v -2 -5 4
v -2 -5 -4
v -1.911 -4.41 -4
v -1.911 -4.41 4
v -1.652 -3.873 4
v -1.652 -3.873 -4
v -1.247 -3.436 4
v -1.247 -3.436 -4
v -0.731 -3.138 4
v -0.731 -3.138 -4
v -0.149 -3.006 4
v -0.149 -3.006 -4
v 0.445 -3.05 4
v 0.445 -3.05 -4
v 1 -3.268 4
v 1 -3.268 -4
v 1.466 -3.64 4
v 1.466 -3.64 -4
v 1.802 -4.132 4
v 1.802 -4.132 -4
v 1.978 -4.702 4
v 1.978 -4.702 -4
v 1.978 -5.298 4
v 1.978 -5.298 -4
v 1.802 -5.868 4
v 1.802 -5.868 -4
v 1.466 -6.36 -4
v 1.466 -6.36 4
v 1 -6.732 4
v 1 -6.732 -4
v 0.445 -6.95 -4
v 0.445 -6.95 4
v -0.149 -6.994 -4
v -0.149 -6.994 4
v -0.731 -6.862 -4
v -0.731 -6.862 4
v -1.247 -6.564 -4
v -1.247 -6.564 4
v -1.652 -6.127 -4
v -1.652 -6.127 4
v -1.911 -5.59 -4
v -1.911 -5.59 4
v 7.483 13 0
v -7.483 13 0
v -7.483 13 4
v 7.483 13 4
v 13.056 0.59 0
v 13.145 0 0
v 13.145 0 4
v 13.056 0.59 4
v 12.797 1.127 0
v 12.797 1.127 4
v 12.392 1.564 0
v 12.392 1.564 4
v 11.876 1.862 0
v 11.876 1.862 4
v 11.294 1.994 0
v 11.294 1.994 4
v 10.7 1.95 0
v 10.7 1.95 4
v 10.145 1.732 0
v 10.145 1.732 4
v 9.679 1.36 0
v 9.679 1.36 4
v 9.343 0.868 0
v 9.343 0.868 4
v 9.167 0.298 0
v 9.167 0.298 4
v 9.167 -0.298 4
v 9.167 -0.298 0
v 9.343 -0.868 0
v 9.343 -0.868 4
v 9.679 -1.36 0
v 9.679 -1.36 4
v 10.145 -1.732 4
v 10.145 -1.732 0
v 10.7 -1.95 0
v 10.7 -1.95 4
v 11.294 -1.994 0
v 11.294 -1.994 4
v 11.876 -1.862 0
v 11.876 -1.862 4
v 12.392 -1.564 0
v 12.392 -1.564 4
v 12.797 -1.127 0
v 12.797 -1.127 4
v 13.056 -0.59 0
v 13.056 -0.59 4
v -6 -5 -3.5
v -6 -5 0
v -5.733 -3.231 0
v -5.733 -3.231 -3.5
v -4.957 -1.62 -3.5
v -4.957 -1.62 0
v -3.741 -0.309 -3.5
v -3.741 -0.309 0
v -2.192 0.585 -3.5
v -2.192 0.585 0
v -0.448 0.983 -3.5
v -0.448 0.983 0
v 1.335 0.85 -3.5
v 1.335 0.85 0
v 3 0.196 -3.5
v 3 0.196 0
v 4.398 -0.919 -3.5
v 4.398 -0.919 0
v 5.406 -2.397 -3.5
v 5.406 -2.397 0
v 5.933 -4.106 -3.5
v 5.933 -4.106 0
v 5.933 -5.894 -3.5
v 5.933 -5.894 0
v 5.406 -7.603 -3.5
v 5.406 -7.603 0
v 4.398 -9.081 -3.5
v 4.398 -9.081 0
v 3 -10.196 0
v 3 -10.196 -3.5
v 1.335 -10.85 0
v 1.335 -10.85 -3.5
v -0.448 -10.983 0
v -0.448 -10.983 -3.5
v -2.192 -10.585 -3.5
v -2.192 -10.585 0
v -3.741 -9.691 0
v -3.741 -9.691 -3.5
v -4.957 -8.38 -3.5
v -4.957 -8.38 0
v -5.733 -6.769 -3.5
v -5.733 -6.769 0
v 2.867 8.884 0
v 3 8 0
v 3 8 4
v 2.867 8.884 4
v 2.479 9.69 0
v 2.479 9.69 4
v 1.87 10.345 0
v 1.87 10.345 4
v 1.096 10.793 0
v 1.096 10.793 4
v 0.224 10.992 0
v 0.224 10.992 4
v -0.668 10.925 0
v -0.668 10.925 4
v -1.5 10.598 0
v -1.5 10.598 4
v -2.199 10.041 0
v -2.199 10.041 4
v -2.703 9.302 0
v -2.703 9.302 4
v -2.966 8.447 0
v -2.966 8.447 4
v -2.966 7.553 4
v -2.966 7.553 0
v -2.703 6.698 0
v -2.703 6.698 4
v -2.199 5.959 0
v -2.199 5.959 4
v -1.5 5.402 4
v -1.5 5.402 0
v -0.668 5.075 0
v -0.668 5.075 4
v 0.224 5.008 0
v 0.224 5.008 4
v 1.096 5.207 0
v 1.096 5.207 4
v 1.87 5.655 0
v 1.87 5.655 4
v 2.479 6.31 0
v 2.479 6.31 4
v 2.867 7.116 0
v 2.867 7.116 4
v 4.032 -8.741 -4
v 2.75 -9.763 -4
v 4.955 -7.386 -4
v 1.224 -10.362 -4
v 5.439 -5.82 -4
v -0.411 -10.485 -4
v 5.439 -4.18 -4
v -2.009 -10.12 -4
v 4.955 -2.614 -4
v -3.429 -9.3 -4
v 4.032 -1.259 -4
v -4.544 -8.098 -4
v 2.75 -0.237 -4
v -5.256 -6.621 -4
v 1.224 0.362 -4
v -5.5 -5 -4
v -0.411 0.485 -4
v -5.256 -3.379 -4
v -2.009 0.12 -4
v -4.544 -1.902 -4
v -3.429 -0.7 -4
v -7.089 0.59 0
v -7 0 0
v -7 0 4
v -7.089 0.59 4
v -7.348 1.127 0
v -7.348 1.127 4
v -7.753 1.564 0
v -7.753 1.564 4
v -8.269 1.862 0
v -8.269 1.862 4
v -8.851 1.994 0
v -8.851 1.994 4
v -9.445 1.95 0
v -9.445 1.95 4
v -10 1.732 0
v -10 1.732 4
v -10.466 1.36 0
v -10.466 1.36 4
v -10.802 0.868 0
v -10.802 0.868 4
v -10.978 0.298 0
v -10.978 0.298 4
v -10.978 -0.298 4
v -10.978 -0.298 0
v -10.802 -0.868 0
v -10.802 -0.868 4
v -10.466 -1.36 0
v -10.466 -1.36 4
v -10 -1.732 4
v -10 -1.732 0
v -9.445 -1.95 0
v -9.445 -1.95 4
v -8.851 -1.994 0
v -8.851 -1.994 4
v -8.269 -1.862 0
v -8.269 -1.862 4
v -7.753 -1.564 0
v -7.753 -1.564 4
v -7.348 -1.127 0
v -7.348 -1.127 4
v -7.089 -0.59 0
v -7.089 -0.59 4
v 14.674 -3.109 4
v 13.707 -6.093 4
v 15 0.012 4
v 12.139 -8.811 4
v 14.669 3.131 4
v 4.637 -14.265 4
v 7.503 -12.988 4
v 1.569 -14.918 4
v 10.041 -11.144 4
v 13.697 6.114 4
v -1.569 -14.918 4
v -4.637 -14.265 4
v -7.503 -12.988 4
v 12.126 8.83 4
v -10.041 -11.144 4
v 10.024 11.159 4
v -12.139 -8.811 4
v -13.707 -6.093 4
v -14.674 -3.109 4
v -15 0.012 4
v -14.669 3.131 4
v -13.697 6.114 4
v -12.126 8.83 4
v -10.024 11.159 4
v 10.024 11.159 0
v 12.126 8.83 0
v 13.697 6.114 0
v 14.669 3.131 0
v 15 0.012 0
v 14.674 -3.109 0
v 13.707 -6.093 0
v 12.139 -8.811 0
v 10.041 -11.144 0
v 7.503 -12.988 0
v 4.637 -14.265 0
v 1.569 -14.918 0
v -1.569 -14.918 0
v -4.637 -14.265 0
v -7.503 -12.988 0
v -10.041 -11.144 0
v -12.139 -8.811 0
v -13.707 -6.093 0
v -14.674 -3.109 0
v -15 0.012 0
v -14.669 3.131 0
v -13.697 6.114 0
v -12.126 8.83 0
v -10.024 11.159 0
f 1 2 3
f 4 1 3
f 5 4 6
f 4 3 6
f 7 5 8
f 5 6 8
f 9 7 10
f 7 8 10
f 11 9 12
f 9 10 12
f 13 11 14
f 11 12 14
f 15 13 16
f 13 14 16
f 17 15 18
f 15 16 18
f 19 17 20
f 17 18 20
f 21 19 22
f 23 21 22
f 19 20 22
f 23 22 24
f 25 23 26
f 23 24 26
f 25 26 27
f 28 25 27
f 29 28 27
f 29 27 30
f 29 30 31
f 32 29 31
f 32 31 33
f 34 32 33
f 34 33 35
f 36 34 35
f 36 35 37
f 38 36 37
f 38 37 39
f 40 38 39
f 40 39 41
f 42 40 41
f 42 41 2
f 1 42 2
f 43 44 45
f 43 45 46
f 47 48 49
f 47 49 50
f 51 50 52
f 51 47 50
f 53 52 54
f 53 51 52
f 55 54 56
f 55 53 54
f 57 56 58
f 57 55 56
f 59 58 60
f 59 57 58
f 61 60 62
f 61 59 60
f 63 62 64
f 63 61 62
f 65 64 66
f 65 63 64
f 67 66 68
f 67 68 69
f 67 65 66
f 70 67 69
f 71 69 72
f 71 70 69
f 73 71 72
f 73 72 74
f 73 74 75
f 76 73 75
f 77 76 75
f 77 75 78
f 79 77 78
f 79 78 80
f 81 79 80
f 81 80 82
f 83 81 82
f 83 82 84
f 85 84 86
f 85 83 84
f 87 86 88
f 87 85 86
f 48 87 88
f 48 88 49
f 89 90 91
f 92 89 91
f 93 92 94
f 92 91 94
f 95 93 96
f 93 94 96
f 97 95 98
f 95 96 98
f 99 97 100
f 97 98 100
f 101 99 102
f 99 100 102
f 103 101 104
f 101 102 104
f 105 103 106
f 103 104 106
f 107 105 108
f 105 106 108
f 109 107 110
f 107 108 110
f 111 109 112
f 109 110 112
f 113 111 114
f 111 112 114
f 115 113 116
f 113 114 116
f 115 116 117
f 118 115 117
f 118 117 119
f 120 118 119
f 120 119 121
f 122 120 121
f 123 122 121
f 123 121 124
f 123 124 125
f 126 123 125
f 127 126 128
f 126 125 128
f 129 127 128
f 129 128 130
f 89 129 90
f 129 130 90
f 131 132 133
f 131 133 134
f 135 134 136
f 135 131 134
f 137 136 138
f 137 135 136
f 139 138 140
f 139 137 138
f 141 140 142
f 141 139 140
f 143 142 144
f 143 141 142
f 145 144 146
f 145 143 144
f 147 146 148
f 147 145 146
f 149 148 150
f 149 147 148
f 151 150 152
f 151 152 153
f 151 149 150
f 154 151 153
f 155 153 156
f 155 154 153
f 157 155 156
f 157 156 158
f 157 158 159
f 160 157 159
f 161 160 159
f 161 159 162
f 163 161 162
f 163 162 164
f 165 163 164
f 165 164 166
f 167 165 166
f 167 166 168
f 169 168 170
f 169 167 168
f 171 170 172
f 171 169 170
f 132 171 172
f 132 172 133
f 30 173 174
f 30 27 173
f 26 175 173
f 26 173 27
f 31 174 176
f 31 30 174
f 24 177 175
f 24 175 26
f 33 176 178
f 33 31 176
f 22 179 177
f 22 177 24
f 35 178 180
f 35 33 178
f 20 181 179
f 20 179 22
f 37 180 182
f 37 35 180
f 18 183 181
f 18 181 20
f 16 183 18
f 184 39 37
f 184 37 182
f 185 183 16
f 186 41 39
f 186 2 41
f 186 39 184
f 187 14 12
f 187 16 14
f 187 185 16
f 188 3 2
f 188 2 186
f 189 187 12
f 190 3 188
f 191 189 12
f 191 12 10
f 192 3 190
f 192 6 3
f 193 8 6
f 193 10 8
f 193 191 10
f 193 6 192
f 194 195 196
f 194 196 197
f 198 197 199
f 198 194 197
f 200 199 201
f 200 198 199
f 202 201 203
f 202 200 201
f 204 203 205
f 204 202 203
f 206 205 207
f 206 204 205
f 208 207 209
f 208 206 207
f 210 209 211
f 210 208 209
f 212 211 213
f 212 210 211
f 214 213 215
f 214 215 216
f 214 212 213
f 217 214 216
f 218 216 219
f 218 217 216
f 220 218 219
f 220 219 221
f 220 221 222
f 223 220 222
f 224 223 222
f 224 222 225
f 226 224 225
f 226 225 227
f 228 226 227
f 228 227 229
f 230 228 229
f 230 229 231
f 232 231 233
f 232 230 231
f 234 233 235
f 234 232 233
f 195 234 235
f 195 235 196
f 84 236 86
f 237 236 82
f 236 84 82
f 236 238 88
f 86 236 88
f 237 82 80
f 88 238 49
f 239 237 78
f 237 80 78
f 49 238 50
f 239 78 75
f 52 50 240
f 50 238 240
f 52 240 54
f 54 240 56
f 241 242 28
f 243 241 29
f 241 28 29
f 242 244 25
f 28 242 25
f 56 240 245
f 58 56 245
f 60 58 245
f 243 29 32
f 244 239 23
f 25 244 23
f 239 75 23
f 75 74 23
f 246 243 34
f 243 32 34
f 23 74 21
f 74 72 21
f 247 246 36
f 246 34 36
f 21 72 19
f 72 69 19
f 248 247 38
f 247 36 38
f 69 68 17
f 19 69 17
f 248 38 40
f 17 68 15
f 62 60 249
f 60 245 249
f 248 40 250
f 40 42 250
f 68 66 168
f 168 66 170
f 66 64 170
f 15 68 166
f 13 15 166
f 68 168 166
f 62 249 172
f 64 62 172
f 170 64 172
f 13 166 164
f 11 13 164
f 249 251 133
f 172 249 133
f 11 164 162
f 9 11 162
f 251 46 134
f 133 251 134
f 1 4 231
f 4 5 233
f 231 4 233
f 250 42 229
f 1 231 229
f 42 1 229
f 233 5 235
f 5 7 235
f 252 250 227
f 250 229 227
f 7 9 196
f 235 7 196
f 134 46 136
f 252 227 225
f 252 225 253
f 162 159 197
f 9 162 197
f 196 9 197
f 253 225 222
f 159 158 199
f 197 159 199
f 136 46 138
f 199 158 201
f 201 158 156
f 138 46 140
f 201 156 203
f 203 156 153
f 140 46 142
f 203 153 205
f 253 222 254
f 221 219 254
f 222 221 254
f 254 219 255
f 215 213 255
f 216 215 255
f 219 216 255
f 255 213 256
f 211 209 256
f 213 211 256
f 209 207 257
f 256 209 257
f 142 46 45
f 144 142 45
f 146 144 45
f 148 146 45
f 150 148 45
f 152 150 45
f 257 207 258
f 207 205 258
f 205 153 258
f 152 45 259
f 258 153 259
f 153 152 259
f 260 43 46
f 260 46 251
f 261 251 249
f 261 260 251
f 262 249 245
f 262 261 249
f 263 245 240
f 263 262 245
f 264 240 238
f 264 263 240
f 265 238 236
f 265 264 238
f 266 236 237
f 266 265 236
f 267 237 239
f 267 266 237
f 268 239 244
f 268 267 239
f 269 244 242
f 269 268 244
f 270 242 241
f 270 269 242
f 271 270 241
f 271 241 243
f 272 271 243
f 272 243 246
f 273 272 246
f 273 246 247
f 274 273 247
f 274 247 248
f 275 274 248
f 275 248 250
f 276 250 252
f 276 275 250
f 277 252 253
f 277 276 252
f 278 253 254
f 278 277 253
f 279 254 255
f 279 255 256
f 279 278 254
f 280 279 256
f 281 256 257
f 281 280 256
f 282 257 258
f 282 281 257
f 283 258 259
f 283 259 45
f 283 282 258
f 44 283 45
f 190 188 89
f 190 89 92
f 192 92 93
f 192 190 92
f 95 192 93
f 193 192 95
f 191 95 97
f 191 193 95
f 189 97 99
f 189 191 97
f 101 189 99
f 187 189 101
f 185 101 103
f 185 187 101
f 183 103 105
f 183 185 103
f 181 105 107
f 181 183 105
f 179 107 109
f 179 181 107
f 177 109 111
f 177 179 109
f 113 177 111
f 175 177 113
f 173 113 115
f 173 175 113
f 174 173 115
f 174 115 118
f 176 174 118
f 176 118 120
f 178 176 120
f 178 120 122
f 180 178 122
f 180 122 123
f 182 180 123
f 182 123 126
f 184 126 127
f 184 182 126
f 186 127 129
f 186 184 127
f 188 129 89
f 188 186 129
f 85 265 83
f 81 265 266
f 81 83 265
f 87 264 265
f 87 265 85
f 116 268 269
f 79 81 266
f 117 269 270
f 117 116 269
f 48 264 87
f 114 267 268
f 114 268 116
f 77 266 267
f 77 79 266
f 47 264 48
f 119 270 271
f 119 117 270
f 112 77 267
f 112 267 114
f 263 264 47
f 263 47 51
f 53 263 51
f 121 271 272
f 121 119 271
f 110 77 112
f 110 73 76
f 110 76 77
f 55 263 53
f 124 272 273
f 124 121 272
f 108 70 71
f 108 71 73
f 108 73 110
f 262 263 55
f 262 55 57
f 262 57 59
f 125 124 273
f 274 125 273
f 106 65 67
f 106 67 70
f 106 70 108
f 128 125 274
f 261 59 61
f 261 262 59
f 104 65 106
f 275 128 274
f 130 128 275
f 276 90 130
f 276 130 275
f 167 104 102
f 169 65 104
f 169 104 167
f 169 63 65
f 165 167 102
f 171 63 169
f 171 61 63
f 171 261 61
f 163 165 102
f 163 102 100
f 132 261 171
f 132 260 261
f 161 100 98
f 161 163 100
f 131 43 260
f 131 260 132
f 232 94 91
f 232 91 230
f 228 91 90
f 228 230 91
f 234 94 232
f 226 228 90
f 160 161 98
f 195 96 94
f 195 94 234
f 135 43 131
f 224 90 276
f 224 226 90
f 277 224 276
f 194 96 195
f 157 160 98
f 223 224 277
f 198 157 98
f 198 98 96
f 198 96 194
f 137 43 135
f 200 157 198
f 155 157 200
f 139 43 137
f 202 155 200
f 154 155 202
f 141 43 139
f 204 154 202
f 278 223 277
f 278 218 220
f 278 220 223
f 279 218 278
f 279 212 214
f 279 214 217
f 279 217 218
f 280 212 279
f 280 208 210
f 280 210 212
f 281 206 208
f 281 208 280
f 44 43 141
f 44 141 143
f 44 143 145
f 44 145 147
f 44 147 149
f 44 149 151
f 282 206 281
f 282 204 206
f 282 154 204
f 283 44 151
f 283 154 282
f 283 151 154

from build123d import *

# Parameters (mm, degrees)
SKETCH1_R           = 3
SKETCH1_R_2         = 2
BOSS_EXTRUDE1_DEPTH = 4
SKETCH2_R           = 6
BOSS_EXTRUDE2_DEPTH = 4
SKETCH3_R           = 2
CUT_EXTRUDE1_DEPTH  = 9
CHAMFER1_SIZE       = 0.5


with BuildPart() as part:
    # Sketch1 → Boss-Extrude1 (new body)
    with BuildSketch(Plane.XY):
        with BuildLine():
            Line((-7.483314774, 13), (7.483314774, 13))
            ThreePointArc((7.483314774, 13), (0, -15), (-7.483314774, 13))
        make_face()
        with Locations((0, 8)):
            Circle(SKETCH1_R, mode=Mode.SUBTRACT)
        with Locations((-9, 0)):
            Circle(SKETCH1_R_2, mode=Mode.SUBTRACT)
        with Locations((11.144937976, 0)):
            Circle(SKETCH1_R_2, mode=Mode.SUBTRACT)
    extrude(amount=BOSS_EXTRUDE1_DEPTH)

    # Sketch2 → Boss-Extrude2 (add)
    with BuildSketch(Plane(origin=(0, 0, 0), x_dir=(-1, 0, 0), z_dir=(0, 0, -1))):
        with Locations((0, -5)):
            Circle(SKETCH2_R)
    extrude(amount=BOSS_EXTRUDE2_DEPTH)

    # Sketch3 → Cut-Extrude1 (cut, through all)
    with BuildSketch(Plane(origin=(0, 0, -4), x_dir=(-1, 0, 0), z_dir=(0, 0, -1))):
        with Locations((0, -5)):
            Circle(SKETCH3_R)
    extrude(amount=-CUT_EXTRUDE1_DEPTH, mode=Mode.SUBTRACT)

    # Chamfer1
    chamfer1_edges = [part.edges().sort_by_distance(p)[0] for p in [
        (6, -5, -4),
    ]]
    chamfer(chamfer1_edges, length=CHAMFER1_SIZE)


solid = part.part
